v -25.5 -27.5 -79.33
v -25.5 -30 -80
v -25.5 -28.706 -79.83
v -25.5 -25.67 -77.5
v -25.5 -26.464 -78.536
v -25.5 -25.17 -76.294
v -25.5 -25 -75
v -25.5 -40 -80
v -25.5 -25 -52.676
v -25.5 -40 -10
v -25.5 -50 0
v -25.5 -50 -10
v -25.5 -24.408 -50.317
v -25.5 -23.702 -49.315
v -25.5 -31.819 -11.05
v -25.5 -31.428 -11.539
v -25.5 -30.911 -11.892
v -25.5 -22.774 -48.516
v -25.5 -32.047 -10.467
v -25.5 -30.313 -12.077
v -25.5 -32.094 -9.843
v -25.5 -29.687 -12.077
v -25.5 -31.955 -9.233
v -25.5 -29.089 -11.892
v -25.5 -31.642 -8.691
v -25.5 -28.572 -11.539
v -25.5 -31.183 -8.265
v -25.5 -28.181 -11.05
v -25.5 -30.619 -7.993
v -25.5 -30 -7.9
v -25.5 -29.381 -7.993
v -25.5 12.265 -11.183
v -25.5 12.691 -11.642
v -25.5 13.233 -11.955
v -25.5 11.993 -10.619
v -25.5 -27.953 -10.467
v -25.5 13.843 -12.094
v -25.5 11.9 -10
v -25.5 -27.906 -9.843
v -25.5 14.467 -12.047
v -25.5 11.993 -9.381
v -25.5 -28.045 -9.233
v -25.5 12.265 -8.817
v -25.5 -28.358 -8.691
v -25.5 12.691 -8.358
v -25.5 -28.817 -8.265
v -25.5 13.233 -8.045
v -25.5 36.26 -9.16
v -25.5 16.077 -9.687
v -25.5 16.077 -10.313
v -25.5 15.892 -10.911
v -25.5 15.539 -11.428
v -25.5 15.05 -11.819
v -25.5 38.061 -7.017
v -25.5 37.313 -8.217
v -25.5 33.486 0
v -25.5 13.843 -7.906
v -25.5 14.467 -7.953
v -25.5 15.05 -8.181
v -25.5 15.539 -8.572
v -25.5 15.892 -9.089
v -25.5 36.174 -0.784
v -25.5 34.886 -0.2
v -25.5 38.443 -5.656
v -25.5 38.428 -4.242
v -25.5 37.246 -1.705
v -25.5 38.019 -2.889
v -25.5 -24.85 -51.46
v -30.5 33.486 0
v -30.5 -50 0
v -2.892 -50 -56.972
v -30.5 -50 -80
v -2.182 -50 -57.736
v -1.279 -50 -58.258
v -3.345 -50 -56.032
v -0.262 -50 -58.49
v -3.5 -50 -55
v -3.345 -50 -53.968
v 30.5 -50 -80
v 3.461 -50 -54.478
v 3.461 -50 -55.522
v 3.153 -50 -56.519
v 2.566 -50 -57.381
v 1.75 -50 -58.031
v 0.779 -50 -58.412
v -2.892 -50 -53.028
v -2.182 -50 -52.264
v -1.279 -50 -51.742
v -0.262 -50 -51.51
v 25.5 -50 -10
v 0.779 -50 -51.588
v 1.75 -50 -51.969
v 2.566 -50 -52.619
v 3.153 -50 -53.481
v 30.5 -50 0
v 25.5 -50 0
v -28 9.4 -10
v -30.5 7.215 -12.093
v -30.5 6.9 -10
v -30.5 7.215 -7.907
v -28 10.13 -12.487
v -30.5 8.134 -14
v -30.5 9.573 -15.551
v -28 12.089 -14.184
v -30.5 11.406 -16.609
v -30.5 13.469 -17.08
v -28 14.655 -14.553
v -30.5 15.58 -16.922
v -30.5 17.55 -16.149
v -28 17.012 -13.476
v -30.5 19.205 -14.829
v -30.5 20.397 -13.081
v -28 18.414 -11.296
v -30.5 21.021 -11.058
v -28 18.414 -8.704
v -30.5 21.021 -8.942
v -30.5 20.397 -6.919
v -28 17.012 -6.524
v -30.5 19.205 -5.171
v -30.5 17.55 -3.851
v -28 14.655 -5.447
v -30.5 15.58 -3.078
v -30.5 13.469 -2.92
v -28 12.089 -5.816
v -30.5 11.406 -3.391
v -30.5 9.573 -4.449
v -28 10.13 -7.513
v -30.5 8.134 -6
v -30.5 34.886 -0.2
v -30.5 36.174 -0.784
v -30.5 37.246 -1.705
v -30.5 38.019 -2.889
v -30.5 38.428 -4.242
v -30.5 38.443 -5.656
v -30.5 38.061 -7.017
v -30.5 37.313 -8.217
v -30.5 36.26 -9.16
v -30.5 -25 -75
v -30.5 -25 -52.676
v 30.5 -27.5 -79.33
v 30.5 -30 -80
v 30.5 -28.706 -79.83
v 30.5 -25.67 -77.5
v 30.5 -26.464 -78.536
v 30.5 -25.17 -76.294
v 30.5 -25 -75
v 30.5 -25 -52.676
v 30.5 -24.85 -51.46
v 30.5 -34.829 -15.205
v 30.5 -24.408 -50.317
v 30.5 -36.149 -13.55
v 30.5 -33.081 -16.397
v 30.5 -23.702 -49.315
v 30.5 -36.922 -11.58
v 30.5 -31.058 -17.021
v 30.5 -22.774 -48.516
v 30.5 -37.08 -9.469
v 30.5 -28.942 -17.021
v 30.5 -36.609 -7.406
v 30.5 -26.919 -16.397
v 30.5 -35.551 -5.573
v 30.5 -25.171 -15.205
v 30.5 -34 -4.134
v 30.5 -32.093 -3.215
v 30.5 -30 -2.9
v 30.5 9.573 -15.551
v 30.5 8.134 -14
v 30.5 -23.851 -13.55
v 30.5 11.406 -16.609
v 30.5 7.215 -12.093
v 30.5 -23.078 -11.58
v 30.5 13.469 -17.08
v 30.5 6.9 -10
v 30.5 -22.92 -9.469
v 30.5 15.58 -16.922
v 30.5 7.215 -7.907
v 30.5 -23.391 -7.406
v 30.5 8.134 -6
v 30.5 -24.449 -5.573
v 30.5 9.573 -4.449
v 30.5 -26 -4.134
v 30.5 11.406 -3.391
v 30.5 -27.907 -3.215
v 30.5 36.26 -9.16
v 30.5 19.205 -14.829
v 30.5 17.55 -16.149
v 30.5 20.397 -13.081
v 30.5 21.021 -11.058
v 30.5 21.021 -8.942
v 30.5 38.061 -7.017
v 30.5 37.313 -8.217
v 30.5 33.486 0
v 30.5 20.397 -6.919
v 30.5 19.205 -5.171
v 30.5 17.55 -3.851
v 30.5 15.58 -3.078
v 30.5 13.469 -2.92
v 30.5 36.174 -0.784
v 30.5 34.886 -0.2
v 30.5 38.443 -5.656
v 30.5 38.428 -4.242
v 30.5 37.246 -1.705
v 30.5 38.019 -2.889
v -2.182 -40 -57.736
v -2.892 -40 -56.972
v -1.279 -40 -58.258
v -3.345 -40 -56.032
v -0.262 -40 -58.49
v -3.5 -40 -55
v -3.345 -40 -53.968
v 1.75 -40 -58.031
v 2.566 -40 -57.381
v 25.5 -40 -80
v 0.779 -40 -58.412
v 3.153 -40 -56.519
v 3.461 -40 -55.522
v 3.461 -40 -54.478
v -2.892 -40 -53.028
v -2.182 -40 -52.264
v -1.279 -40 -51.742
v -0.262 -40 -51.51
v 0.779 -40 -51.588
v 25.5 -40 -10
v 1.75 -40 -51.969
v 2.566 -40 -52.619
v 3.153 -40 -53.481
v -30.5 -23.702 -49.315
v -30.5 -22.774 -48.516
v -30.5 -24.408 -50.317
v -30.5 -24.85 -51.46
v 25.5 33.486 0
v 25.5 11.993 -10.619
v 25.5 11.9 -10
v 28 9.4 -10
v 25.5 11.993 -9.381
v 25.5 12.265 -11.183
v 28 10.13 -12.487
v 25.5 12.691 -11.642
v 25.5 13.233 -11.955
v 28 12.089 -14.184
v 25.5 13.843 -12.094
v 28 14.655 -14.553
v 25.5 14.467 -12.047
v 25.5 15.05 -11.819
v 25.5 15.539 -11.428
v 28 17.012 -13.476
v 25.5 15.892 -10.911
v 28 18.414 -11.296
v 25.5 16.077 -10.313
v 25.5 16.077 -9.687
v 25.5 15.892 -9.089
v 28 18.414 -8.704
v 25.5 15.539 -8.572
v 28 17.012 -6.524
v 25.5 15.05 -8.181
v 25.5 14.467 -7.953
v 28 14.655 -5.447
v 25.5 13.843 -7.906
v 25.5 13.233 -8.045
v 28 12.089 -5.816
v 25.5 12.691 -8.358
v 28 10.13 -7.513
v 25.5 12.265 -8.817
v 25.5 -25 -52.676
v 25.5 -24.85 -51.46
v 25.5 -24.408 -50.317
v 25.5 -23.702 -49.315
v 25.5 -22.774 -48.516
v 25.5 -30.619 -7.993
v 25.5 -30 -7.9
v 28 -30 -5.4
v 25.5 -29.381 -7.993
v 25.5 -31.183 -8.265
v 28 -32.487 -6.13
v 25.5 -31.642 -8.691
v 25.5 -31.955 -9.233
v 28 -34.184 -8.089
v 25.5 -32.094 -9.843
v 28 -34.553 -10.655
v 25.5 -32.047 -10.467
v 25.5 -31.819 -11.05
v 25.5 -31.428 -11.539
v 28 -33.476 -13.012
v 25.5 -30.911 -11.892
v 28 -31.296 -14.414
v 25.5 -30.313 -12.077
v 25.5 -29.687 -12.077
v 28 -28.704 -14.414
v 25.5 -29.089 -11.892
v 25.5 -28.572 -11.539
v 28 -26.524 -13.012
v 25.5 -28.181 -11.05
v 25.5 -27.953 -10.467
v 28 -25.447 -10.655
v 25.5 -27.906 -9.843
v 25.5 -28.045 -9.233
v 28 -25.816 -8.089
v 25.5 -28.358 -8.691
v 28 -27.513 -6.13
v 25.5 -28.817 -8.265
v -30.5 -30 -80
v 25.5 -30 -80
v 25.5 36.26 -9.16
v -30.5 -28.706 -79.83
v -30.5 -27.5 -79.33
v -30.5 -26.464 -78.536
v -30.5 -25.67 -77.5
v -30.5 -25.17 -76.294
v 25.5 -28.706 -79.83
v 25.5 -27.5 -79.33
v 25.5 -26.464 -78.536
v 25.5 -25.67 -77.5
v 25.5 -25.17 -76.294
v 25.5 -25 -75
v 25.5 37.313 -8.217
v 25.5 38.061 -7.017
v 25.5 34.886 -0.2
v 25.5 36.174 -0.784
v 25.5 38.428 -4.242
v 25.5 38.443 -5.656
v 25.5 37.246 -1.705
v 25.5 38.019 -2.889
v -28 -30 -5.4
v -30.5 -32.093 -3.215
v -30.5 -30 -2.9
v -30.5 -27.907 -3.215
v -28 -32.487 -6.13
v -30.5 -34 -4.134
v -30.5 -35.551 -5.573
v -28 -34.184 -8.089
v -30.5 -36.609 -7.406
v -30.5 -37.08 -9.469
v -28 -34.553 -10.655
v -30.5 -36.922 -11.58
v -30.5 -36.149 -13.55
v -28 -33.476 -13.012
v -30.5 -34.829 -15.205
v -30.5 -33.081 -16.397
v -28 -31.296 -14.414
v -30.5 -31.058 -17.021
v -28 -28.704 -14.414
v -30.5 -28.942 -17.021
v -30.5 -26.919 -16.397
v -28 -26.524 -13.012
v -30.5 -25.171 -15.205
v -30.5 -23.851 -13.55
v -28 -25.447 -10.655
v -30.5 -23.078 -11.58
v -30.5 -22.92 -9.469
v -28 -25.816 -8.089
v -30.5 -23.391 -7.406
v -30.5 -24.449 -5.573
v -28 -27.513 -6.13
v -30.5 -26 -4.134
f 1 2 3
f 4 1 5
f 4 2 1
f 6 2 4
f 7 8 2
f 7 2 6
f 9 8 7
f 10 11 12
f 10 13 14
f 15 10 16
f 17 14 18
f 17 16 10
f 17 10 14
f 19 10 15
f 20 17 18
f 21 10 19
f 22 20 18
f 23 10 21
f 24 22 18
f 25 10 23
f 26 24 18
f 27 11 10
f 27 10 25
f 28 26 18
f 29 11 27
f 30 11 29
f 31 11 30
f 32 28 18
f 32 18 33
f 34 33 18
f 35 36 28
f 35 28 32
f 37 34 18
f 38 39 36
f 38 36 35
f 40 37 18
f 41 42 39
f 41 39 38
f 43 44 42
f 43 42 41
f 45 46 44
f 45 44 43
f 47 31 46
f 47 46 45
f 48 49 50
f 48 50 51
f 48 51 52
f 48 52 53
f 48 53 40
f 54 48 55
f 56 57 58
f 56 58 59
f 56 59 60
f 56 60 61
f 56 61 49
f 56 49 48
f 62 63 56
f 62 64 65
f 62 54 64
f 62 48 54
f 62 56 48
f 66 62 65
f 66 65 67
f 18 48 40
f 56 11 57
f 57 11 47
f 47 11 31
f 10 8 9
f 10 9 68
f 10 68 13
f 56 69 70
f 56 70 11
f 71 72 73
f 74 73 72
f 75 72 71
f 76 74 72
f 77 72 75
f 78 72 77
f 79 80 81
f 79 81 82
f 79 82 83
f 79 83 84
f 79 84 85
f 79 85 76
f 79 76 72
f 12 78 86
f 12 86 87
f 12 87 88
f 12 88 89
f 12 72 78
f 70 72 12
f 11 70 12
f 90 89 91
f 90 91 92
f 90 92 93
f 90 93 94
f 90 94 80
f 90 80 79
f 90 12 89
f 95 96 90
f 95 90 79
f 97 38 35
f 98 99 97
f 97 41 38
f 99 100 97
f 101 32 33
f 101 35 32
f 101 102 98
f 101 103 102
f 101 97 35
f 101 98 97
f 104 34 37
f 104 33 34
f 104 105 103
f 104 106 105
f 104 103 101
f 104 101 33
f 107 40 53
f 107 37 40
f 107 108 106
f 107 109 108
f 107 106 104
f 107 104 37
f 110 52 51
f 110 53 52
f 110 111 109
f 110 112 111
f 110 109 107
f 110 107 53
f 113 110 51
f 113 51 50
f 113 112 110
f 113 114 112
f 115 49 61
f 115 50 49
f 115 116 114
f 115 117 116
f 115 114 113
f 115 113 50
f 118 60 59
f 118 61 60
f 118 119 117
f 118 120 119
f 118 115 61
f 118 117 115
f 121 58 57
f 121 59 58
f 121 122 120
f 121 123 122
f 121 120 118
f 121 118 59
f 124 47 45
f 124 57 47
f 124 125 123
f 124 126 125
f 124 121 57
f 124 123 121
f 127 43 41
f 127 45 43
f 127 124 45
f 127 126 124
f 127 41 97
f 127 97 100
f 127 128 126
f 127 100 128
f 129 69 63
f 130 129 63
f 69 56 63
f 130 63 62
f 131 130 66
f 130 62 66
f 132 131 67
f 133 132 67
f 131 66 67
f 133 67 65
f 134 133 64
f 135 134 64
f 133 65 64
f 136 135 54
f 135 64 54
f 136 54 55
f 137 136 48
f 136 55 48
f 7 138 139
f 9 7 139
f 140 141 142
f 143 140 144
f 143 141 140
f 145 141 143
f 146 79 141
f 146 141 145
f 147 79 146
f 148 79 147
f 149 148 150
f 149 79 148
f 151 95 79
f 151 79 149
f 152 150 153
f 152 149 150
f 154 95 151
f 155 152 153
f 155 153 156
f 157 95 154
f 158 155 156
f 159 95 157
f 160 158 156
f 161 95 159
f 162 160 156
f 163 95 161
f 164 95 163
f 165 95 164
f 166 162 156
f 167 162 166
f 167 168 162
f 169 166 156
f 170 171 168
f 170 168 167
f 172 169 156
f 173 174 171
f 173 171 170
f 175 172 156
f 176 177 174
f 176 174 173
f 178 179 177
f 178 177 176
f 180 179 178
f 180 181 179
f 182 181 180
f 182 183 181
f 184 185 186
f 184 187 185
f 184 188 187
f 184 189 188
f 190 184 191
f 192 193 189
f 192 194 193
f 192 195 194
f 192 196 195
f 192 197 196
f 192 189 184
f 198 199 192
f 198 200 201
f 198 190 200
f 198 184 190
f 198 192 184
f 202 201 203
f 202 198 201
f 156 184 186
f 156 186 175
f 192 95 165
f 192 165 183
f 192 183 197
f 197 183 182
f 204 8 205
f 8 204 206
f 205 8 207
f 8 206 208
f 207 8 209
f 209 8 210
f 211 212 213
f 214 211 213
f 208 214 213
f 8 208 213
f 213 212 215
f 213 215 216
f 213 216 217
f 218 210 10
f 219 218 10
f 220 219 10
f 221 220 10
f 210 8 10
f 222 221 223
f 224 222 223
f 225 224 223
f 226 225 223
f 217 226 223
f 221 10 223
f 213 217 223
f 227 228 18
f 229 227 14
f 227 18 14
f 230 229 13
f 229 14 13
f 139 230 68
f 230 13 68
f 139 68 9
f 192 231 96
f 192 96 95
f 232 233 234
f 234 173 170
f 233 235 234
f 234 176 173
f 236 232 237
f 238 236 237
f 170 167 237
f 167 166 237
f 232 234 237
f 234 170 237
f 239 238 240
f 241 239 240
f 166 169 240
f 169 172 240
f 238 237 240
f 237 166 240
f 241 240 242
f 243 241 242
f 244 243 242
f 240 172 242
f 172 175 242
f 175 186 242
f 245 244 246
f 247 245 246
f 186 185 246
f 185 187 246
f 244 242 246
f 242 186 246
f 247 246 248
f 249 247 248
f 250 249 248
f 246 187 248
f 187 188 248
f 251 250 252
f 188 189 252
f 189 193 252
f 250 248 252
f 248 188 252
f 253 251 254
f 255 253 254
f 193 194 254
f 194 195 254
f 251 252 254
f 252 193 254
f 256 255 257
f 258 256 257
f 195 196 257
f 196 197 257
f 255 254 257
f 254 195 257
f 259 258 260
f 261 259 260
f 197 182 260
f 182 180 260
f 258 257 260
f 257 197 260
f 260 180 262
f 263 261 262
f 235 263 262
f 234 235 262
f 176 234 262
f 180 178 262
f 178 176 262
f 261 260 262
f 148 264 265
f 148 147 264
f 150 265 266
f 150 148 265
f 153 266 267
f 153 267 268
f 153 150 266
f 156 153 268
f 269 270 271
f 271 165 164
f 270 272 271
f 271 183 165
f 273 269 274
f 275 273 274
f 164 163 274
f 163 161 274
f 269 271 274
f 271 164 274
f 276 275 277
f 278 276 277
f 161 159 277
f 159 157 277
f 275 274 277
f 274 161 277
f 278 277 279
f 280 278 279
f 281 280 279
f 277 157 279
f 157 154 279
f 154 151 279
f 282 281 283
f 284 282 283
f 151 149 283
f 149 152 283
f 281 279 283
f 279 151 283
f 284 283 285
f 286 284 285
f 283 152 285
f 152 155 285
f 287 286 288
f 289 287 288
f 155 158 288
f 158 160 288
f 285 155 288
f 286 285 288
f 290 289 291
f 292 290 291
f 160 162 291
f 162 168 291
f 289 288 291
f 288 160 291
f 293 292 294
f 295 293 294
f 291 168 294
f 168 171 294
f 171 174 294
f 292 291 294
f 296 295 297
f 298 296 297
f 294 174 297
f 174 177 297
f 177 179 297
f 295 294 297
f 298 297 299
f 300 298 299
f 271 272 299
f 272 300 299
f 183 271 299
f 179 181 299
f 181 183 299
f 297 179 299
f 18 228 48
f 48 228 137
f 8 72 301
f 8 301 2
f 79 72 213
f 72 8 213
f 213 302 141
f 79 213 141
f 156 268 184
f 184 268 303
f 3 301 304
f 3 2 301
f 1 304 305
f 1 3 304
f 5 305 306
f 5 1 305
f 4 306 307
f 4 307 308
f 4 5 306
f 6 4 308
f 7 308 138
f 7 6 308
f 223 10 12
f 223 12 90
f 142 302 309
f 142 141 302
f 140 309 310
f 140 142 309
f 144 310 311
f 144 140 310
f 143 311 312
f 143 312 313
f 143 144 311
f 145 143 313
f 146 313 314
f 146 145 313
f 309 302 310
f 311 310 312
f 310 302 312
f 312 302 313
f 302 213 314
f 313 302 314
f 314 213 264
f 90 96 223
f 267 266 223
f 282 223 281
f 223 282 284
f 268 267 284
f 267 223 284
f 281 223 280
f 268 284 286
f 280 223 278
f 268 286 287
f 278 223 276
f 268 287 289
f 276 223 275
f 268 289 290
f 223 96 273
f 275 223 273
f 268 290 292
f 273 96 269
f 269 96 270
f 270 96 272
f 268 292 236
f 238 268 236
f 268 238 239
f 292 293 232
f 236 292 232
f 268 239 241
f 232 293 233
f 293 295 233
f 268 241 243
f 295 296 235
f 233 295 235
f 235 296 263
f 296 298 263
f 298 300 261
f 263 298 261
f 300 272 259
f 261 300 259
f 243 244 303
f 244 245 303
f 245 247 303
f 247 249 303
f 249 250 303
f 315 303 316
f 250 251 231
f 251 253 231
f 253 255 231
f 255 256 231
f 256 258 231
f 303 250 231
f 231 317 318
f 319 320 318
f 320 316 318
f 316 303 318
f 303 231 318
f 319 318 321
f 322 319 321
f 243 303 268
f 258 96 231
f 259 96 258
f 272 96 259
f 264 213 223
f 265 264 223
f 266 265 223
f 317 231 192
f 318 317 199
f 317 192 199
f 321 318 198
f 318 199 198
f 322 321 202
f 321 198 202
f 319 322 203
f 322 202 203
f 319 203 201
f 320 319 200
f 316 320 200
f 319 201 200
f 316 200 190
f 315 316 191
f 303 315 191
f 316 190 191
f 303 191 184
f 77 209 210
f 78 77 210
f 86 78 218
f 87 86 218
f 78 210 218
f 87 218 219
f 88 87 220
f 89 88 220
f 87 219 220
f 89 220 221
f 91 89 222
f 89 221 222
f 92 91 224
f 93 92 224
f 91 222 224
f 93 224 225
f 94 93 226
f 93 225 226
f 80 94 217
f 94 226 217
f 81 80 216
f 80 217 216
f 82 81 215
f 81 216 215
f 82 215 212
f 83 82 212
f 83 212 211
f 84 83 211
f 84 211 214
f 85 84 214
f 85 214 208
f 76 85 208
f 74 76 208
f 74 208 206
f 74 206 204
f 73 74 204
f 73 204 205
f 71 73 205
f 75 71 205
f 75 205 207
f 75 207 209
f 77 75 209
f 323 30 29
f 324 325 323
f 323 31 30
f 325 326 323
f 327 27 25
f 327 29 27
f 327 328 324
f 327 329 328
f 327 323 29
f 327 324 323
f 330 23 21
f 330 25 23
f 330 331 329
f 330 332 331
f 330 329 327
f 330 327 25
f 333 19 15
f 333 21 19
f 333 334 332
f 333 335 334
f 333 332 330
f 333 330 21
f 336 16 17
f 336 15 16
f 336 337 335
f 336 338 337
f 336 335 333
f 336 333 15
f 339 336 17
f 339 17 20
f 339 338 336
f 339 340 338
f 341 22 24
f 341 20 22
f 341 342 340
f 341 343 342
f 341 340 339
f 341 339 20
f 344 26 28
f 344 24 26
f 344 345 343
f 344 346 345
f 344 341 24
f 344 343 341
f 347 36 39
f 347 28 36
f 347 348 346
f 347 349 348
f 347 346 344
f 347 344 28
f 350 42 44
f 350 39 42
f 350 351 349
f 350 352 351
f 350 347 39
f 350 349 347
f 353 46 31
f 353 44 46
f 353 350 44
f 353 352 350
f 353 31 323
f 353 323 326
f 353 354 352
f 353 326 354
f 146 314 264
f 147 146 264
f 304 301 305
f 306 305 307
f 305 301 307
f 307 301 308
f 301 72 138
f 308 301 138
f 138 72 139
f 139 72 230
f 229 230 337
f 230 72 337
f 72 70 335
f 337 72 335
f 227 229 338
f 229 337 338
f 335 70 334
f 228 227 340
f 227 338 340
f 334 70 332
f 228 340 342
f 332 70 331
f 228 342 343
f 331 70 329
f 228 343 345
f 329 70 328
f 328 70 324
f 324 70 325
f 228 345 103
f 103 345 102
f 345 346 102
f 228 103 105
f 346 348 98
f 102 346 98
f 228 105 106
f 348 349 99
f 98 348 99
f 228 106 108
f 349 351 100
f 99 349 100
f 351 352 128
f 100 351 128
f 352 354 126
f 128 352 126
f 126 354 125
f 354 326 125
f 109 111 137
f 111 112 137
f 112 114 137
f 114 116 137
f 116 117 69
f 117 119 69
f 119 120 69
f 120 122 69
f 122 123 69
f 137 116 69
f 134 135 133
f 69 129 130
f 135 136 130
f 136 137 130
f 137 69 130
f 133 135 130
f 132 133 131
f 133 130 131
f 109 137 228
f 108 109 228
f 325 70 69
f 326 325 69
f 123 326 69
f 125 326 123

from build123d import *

# Parameters (mm, degrees)
SKETCH1_W           = 61
SKETCH1_H           = 100
BOSS_EXTRUDE1_DEPTH = 80
SKETCH2_OUTSIDE_W   = 110.37
SKETCH2_OUTSIDE_H   = 130.37
CUT_EXTRUDE1_DEPTH  = 113.343224095
SKETCH3_W           = 51
SKETCH3_H           = 90
CUT_EXTRUDE2_DEPTH  = 100.147617218
SKETCH4_W           = 51
SKETCH4_H           = 10
CUT_EXTRUDE3_DEPTH  = 125.21855739
FILLET3_R           = 5
FILLET4_R           = 5
SKETCH5_R           = 3.5
CUT_EXTRUDE4_DEPTH  = 117.147842498


with BuildPart() as part:
    # Sketch1 → Boss-Extrude1 (new body)
    with BuildSketch(Plane.XY):
        Rectangle(SKETCH1_W, SKETCH1_H)
    extrude(amount=-BOSS_EXTRUDE1_DEPTH)

    # Sketch2 outside → Cut-Extrude1 (cut, through all)
    with BuildSketch(Plane.ZY.offset(30.5)):
        with Locations((-40, 0)):
            Rectangle(SKETCH2_OUTSIDE_W, SKETCH2_OUTSIDE_H)
        Polygon((-80, -25), (-50, -25), (0, 50), (0, -50), (-80, -50), align=None, mode=Mode.SUBTRACT)
    extrude(amount=-CUT_EXTRUDE1_DEPTH, mode=Mode.SUBTRACT)

    # Sketch3 → Cut-Extrude2 (cut, through all)
    with BuildSketch(Plane.XY):
        with Locations((0, 5)):
            Rectangle(SKETCH3_W, SKETCH3_H)
    extrude(amount=-CUT_EXTRUDE2_DEPTH, mode=Mode.SUBTRACT)

    # Sketch4 → Cut-Extrude3 (cut, through all)
    with BuildSketch(Plane(origin=(0, -40, 0), x_dir=(1, 0, 0), z_dir=(0, 1, 0))):
        with Locations((0, 5)):
            Rectangle(SKETCH4_W, SKETCH4_H)
    extrude(amount=-CUT_EXTRUDE3_DEPTH, mode=Mode.SUBTRACT)

    # Sketch9<8> → Cut-Revolve4 (revolve, cut)
    with BuildSketch(Plane.XY.offset(-10)):
        Polygon((-23.4, 14), (-30.5, 6.9), (-30.5, 14), align=None)
    cut_revolve4 = revolve(axis=Axis((-30.5, 14, -10), (1, 0, 0)), mode=Mode.SUBTRACT)

    # Sketch9<9> → Cut-Revolve5 (revolve, cut)
    with BuildSketch(Plane.XY.offset(-10)):
        Polygon((-23.4, -30), (-30.5, -37.1), (-30.5, -30), align=None)
    cut_revolve5 = revolve(axis=Axis((-30.5, -30, -10), (1, 0, 0)), mode=Mode.SUBTRACT)

    # Mirror1: Cut-Revolve4, Cut-Revolve5 across plane
    add(cut_revolve4.mirror(Plane(origin=(0, 0, 0), x_dir=(0, 0, 1), z_dir=(1, 0, 0))), mode=Mode.SUBTRACT)
    add(cut_revolve5.mirror(Plane(origin=(0, 0, 0), x_dir=(0, 0, 1), z_dir=(1, 0, 0))), mode=Mode.SUBTRACT)

    # Fillet3
    fillet3_edges = [part.edges().sort_by_distance(p)[0] for p in [
        (28, 50, 0),
        (-28, 50, 0),
    ]]
    fillet(fillet3_edges, radius=FILLET3_R)

    # Fillet4
    fillet4_edges = [part.edges().sort_by_distance(p)[0] for p in [
        (28, -25, -80),
        (-28, -25, -80),
        (-28, -25, -50),
        (28, -25, -50),
    ]]
    fillet(fillet4_edges, radius=FILLET4_R)

    # Sketch5 → Cut-Extrude4 (cut, through all)
    with BuildSketch(Plane(origin=(0, -40, 0), x_dir=(1, 0, 0), z_dir=(0, 1, 0))):
        with Locations((0, 55)):
            Circle(SKETCH5_R)
    extrude(amount=-CUT_EXTRUDE4_DEPTH, mode=Mode.SUBTRACT)


solid = part.part
